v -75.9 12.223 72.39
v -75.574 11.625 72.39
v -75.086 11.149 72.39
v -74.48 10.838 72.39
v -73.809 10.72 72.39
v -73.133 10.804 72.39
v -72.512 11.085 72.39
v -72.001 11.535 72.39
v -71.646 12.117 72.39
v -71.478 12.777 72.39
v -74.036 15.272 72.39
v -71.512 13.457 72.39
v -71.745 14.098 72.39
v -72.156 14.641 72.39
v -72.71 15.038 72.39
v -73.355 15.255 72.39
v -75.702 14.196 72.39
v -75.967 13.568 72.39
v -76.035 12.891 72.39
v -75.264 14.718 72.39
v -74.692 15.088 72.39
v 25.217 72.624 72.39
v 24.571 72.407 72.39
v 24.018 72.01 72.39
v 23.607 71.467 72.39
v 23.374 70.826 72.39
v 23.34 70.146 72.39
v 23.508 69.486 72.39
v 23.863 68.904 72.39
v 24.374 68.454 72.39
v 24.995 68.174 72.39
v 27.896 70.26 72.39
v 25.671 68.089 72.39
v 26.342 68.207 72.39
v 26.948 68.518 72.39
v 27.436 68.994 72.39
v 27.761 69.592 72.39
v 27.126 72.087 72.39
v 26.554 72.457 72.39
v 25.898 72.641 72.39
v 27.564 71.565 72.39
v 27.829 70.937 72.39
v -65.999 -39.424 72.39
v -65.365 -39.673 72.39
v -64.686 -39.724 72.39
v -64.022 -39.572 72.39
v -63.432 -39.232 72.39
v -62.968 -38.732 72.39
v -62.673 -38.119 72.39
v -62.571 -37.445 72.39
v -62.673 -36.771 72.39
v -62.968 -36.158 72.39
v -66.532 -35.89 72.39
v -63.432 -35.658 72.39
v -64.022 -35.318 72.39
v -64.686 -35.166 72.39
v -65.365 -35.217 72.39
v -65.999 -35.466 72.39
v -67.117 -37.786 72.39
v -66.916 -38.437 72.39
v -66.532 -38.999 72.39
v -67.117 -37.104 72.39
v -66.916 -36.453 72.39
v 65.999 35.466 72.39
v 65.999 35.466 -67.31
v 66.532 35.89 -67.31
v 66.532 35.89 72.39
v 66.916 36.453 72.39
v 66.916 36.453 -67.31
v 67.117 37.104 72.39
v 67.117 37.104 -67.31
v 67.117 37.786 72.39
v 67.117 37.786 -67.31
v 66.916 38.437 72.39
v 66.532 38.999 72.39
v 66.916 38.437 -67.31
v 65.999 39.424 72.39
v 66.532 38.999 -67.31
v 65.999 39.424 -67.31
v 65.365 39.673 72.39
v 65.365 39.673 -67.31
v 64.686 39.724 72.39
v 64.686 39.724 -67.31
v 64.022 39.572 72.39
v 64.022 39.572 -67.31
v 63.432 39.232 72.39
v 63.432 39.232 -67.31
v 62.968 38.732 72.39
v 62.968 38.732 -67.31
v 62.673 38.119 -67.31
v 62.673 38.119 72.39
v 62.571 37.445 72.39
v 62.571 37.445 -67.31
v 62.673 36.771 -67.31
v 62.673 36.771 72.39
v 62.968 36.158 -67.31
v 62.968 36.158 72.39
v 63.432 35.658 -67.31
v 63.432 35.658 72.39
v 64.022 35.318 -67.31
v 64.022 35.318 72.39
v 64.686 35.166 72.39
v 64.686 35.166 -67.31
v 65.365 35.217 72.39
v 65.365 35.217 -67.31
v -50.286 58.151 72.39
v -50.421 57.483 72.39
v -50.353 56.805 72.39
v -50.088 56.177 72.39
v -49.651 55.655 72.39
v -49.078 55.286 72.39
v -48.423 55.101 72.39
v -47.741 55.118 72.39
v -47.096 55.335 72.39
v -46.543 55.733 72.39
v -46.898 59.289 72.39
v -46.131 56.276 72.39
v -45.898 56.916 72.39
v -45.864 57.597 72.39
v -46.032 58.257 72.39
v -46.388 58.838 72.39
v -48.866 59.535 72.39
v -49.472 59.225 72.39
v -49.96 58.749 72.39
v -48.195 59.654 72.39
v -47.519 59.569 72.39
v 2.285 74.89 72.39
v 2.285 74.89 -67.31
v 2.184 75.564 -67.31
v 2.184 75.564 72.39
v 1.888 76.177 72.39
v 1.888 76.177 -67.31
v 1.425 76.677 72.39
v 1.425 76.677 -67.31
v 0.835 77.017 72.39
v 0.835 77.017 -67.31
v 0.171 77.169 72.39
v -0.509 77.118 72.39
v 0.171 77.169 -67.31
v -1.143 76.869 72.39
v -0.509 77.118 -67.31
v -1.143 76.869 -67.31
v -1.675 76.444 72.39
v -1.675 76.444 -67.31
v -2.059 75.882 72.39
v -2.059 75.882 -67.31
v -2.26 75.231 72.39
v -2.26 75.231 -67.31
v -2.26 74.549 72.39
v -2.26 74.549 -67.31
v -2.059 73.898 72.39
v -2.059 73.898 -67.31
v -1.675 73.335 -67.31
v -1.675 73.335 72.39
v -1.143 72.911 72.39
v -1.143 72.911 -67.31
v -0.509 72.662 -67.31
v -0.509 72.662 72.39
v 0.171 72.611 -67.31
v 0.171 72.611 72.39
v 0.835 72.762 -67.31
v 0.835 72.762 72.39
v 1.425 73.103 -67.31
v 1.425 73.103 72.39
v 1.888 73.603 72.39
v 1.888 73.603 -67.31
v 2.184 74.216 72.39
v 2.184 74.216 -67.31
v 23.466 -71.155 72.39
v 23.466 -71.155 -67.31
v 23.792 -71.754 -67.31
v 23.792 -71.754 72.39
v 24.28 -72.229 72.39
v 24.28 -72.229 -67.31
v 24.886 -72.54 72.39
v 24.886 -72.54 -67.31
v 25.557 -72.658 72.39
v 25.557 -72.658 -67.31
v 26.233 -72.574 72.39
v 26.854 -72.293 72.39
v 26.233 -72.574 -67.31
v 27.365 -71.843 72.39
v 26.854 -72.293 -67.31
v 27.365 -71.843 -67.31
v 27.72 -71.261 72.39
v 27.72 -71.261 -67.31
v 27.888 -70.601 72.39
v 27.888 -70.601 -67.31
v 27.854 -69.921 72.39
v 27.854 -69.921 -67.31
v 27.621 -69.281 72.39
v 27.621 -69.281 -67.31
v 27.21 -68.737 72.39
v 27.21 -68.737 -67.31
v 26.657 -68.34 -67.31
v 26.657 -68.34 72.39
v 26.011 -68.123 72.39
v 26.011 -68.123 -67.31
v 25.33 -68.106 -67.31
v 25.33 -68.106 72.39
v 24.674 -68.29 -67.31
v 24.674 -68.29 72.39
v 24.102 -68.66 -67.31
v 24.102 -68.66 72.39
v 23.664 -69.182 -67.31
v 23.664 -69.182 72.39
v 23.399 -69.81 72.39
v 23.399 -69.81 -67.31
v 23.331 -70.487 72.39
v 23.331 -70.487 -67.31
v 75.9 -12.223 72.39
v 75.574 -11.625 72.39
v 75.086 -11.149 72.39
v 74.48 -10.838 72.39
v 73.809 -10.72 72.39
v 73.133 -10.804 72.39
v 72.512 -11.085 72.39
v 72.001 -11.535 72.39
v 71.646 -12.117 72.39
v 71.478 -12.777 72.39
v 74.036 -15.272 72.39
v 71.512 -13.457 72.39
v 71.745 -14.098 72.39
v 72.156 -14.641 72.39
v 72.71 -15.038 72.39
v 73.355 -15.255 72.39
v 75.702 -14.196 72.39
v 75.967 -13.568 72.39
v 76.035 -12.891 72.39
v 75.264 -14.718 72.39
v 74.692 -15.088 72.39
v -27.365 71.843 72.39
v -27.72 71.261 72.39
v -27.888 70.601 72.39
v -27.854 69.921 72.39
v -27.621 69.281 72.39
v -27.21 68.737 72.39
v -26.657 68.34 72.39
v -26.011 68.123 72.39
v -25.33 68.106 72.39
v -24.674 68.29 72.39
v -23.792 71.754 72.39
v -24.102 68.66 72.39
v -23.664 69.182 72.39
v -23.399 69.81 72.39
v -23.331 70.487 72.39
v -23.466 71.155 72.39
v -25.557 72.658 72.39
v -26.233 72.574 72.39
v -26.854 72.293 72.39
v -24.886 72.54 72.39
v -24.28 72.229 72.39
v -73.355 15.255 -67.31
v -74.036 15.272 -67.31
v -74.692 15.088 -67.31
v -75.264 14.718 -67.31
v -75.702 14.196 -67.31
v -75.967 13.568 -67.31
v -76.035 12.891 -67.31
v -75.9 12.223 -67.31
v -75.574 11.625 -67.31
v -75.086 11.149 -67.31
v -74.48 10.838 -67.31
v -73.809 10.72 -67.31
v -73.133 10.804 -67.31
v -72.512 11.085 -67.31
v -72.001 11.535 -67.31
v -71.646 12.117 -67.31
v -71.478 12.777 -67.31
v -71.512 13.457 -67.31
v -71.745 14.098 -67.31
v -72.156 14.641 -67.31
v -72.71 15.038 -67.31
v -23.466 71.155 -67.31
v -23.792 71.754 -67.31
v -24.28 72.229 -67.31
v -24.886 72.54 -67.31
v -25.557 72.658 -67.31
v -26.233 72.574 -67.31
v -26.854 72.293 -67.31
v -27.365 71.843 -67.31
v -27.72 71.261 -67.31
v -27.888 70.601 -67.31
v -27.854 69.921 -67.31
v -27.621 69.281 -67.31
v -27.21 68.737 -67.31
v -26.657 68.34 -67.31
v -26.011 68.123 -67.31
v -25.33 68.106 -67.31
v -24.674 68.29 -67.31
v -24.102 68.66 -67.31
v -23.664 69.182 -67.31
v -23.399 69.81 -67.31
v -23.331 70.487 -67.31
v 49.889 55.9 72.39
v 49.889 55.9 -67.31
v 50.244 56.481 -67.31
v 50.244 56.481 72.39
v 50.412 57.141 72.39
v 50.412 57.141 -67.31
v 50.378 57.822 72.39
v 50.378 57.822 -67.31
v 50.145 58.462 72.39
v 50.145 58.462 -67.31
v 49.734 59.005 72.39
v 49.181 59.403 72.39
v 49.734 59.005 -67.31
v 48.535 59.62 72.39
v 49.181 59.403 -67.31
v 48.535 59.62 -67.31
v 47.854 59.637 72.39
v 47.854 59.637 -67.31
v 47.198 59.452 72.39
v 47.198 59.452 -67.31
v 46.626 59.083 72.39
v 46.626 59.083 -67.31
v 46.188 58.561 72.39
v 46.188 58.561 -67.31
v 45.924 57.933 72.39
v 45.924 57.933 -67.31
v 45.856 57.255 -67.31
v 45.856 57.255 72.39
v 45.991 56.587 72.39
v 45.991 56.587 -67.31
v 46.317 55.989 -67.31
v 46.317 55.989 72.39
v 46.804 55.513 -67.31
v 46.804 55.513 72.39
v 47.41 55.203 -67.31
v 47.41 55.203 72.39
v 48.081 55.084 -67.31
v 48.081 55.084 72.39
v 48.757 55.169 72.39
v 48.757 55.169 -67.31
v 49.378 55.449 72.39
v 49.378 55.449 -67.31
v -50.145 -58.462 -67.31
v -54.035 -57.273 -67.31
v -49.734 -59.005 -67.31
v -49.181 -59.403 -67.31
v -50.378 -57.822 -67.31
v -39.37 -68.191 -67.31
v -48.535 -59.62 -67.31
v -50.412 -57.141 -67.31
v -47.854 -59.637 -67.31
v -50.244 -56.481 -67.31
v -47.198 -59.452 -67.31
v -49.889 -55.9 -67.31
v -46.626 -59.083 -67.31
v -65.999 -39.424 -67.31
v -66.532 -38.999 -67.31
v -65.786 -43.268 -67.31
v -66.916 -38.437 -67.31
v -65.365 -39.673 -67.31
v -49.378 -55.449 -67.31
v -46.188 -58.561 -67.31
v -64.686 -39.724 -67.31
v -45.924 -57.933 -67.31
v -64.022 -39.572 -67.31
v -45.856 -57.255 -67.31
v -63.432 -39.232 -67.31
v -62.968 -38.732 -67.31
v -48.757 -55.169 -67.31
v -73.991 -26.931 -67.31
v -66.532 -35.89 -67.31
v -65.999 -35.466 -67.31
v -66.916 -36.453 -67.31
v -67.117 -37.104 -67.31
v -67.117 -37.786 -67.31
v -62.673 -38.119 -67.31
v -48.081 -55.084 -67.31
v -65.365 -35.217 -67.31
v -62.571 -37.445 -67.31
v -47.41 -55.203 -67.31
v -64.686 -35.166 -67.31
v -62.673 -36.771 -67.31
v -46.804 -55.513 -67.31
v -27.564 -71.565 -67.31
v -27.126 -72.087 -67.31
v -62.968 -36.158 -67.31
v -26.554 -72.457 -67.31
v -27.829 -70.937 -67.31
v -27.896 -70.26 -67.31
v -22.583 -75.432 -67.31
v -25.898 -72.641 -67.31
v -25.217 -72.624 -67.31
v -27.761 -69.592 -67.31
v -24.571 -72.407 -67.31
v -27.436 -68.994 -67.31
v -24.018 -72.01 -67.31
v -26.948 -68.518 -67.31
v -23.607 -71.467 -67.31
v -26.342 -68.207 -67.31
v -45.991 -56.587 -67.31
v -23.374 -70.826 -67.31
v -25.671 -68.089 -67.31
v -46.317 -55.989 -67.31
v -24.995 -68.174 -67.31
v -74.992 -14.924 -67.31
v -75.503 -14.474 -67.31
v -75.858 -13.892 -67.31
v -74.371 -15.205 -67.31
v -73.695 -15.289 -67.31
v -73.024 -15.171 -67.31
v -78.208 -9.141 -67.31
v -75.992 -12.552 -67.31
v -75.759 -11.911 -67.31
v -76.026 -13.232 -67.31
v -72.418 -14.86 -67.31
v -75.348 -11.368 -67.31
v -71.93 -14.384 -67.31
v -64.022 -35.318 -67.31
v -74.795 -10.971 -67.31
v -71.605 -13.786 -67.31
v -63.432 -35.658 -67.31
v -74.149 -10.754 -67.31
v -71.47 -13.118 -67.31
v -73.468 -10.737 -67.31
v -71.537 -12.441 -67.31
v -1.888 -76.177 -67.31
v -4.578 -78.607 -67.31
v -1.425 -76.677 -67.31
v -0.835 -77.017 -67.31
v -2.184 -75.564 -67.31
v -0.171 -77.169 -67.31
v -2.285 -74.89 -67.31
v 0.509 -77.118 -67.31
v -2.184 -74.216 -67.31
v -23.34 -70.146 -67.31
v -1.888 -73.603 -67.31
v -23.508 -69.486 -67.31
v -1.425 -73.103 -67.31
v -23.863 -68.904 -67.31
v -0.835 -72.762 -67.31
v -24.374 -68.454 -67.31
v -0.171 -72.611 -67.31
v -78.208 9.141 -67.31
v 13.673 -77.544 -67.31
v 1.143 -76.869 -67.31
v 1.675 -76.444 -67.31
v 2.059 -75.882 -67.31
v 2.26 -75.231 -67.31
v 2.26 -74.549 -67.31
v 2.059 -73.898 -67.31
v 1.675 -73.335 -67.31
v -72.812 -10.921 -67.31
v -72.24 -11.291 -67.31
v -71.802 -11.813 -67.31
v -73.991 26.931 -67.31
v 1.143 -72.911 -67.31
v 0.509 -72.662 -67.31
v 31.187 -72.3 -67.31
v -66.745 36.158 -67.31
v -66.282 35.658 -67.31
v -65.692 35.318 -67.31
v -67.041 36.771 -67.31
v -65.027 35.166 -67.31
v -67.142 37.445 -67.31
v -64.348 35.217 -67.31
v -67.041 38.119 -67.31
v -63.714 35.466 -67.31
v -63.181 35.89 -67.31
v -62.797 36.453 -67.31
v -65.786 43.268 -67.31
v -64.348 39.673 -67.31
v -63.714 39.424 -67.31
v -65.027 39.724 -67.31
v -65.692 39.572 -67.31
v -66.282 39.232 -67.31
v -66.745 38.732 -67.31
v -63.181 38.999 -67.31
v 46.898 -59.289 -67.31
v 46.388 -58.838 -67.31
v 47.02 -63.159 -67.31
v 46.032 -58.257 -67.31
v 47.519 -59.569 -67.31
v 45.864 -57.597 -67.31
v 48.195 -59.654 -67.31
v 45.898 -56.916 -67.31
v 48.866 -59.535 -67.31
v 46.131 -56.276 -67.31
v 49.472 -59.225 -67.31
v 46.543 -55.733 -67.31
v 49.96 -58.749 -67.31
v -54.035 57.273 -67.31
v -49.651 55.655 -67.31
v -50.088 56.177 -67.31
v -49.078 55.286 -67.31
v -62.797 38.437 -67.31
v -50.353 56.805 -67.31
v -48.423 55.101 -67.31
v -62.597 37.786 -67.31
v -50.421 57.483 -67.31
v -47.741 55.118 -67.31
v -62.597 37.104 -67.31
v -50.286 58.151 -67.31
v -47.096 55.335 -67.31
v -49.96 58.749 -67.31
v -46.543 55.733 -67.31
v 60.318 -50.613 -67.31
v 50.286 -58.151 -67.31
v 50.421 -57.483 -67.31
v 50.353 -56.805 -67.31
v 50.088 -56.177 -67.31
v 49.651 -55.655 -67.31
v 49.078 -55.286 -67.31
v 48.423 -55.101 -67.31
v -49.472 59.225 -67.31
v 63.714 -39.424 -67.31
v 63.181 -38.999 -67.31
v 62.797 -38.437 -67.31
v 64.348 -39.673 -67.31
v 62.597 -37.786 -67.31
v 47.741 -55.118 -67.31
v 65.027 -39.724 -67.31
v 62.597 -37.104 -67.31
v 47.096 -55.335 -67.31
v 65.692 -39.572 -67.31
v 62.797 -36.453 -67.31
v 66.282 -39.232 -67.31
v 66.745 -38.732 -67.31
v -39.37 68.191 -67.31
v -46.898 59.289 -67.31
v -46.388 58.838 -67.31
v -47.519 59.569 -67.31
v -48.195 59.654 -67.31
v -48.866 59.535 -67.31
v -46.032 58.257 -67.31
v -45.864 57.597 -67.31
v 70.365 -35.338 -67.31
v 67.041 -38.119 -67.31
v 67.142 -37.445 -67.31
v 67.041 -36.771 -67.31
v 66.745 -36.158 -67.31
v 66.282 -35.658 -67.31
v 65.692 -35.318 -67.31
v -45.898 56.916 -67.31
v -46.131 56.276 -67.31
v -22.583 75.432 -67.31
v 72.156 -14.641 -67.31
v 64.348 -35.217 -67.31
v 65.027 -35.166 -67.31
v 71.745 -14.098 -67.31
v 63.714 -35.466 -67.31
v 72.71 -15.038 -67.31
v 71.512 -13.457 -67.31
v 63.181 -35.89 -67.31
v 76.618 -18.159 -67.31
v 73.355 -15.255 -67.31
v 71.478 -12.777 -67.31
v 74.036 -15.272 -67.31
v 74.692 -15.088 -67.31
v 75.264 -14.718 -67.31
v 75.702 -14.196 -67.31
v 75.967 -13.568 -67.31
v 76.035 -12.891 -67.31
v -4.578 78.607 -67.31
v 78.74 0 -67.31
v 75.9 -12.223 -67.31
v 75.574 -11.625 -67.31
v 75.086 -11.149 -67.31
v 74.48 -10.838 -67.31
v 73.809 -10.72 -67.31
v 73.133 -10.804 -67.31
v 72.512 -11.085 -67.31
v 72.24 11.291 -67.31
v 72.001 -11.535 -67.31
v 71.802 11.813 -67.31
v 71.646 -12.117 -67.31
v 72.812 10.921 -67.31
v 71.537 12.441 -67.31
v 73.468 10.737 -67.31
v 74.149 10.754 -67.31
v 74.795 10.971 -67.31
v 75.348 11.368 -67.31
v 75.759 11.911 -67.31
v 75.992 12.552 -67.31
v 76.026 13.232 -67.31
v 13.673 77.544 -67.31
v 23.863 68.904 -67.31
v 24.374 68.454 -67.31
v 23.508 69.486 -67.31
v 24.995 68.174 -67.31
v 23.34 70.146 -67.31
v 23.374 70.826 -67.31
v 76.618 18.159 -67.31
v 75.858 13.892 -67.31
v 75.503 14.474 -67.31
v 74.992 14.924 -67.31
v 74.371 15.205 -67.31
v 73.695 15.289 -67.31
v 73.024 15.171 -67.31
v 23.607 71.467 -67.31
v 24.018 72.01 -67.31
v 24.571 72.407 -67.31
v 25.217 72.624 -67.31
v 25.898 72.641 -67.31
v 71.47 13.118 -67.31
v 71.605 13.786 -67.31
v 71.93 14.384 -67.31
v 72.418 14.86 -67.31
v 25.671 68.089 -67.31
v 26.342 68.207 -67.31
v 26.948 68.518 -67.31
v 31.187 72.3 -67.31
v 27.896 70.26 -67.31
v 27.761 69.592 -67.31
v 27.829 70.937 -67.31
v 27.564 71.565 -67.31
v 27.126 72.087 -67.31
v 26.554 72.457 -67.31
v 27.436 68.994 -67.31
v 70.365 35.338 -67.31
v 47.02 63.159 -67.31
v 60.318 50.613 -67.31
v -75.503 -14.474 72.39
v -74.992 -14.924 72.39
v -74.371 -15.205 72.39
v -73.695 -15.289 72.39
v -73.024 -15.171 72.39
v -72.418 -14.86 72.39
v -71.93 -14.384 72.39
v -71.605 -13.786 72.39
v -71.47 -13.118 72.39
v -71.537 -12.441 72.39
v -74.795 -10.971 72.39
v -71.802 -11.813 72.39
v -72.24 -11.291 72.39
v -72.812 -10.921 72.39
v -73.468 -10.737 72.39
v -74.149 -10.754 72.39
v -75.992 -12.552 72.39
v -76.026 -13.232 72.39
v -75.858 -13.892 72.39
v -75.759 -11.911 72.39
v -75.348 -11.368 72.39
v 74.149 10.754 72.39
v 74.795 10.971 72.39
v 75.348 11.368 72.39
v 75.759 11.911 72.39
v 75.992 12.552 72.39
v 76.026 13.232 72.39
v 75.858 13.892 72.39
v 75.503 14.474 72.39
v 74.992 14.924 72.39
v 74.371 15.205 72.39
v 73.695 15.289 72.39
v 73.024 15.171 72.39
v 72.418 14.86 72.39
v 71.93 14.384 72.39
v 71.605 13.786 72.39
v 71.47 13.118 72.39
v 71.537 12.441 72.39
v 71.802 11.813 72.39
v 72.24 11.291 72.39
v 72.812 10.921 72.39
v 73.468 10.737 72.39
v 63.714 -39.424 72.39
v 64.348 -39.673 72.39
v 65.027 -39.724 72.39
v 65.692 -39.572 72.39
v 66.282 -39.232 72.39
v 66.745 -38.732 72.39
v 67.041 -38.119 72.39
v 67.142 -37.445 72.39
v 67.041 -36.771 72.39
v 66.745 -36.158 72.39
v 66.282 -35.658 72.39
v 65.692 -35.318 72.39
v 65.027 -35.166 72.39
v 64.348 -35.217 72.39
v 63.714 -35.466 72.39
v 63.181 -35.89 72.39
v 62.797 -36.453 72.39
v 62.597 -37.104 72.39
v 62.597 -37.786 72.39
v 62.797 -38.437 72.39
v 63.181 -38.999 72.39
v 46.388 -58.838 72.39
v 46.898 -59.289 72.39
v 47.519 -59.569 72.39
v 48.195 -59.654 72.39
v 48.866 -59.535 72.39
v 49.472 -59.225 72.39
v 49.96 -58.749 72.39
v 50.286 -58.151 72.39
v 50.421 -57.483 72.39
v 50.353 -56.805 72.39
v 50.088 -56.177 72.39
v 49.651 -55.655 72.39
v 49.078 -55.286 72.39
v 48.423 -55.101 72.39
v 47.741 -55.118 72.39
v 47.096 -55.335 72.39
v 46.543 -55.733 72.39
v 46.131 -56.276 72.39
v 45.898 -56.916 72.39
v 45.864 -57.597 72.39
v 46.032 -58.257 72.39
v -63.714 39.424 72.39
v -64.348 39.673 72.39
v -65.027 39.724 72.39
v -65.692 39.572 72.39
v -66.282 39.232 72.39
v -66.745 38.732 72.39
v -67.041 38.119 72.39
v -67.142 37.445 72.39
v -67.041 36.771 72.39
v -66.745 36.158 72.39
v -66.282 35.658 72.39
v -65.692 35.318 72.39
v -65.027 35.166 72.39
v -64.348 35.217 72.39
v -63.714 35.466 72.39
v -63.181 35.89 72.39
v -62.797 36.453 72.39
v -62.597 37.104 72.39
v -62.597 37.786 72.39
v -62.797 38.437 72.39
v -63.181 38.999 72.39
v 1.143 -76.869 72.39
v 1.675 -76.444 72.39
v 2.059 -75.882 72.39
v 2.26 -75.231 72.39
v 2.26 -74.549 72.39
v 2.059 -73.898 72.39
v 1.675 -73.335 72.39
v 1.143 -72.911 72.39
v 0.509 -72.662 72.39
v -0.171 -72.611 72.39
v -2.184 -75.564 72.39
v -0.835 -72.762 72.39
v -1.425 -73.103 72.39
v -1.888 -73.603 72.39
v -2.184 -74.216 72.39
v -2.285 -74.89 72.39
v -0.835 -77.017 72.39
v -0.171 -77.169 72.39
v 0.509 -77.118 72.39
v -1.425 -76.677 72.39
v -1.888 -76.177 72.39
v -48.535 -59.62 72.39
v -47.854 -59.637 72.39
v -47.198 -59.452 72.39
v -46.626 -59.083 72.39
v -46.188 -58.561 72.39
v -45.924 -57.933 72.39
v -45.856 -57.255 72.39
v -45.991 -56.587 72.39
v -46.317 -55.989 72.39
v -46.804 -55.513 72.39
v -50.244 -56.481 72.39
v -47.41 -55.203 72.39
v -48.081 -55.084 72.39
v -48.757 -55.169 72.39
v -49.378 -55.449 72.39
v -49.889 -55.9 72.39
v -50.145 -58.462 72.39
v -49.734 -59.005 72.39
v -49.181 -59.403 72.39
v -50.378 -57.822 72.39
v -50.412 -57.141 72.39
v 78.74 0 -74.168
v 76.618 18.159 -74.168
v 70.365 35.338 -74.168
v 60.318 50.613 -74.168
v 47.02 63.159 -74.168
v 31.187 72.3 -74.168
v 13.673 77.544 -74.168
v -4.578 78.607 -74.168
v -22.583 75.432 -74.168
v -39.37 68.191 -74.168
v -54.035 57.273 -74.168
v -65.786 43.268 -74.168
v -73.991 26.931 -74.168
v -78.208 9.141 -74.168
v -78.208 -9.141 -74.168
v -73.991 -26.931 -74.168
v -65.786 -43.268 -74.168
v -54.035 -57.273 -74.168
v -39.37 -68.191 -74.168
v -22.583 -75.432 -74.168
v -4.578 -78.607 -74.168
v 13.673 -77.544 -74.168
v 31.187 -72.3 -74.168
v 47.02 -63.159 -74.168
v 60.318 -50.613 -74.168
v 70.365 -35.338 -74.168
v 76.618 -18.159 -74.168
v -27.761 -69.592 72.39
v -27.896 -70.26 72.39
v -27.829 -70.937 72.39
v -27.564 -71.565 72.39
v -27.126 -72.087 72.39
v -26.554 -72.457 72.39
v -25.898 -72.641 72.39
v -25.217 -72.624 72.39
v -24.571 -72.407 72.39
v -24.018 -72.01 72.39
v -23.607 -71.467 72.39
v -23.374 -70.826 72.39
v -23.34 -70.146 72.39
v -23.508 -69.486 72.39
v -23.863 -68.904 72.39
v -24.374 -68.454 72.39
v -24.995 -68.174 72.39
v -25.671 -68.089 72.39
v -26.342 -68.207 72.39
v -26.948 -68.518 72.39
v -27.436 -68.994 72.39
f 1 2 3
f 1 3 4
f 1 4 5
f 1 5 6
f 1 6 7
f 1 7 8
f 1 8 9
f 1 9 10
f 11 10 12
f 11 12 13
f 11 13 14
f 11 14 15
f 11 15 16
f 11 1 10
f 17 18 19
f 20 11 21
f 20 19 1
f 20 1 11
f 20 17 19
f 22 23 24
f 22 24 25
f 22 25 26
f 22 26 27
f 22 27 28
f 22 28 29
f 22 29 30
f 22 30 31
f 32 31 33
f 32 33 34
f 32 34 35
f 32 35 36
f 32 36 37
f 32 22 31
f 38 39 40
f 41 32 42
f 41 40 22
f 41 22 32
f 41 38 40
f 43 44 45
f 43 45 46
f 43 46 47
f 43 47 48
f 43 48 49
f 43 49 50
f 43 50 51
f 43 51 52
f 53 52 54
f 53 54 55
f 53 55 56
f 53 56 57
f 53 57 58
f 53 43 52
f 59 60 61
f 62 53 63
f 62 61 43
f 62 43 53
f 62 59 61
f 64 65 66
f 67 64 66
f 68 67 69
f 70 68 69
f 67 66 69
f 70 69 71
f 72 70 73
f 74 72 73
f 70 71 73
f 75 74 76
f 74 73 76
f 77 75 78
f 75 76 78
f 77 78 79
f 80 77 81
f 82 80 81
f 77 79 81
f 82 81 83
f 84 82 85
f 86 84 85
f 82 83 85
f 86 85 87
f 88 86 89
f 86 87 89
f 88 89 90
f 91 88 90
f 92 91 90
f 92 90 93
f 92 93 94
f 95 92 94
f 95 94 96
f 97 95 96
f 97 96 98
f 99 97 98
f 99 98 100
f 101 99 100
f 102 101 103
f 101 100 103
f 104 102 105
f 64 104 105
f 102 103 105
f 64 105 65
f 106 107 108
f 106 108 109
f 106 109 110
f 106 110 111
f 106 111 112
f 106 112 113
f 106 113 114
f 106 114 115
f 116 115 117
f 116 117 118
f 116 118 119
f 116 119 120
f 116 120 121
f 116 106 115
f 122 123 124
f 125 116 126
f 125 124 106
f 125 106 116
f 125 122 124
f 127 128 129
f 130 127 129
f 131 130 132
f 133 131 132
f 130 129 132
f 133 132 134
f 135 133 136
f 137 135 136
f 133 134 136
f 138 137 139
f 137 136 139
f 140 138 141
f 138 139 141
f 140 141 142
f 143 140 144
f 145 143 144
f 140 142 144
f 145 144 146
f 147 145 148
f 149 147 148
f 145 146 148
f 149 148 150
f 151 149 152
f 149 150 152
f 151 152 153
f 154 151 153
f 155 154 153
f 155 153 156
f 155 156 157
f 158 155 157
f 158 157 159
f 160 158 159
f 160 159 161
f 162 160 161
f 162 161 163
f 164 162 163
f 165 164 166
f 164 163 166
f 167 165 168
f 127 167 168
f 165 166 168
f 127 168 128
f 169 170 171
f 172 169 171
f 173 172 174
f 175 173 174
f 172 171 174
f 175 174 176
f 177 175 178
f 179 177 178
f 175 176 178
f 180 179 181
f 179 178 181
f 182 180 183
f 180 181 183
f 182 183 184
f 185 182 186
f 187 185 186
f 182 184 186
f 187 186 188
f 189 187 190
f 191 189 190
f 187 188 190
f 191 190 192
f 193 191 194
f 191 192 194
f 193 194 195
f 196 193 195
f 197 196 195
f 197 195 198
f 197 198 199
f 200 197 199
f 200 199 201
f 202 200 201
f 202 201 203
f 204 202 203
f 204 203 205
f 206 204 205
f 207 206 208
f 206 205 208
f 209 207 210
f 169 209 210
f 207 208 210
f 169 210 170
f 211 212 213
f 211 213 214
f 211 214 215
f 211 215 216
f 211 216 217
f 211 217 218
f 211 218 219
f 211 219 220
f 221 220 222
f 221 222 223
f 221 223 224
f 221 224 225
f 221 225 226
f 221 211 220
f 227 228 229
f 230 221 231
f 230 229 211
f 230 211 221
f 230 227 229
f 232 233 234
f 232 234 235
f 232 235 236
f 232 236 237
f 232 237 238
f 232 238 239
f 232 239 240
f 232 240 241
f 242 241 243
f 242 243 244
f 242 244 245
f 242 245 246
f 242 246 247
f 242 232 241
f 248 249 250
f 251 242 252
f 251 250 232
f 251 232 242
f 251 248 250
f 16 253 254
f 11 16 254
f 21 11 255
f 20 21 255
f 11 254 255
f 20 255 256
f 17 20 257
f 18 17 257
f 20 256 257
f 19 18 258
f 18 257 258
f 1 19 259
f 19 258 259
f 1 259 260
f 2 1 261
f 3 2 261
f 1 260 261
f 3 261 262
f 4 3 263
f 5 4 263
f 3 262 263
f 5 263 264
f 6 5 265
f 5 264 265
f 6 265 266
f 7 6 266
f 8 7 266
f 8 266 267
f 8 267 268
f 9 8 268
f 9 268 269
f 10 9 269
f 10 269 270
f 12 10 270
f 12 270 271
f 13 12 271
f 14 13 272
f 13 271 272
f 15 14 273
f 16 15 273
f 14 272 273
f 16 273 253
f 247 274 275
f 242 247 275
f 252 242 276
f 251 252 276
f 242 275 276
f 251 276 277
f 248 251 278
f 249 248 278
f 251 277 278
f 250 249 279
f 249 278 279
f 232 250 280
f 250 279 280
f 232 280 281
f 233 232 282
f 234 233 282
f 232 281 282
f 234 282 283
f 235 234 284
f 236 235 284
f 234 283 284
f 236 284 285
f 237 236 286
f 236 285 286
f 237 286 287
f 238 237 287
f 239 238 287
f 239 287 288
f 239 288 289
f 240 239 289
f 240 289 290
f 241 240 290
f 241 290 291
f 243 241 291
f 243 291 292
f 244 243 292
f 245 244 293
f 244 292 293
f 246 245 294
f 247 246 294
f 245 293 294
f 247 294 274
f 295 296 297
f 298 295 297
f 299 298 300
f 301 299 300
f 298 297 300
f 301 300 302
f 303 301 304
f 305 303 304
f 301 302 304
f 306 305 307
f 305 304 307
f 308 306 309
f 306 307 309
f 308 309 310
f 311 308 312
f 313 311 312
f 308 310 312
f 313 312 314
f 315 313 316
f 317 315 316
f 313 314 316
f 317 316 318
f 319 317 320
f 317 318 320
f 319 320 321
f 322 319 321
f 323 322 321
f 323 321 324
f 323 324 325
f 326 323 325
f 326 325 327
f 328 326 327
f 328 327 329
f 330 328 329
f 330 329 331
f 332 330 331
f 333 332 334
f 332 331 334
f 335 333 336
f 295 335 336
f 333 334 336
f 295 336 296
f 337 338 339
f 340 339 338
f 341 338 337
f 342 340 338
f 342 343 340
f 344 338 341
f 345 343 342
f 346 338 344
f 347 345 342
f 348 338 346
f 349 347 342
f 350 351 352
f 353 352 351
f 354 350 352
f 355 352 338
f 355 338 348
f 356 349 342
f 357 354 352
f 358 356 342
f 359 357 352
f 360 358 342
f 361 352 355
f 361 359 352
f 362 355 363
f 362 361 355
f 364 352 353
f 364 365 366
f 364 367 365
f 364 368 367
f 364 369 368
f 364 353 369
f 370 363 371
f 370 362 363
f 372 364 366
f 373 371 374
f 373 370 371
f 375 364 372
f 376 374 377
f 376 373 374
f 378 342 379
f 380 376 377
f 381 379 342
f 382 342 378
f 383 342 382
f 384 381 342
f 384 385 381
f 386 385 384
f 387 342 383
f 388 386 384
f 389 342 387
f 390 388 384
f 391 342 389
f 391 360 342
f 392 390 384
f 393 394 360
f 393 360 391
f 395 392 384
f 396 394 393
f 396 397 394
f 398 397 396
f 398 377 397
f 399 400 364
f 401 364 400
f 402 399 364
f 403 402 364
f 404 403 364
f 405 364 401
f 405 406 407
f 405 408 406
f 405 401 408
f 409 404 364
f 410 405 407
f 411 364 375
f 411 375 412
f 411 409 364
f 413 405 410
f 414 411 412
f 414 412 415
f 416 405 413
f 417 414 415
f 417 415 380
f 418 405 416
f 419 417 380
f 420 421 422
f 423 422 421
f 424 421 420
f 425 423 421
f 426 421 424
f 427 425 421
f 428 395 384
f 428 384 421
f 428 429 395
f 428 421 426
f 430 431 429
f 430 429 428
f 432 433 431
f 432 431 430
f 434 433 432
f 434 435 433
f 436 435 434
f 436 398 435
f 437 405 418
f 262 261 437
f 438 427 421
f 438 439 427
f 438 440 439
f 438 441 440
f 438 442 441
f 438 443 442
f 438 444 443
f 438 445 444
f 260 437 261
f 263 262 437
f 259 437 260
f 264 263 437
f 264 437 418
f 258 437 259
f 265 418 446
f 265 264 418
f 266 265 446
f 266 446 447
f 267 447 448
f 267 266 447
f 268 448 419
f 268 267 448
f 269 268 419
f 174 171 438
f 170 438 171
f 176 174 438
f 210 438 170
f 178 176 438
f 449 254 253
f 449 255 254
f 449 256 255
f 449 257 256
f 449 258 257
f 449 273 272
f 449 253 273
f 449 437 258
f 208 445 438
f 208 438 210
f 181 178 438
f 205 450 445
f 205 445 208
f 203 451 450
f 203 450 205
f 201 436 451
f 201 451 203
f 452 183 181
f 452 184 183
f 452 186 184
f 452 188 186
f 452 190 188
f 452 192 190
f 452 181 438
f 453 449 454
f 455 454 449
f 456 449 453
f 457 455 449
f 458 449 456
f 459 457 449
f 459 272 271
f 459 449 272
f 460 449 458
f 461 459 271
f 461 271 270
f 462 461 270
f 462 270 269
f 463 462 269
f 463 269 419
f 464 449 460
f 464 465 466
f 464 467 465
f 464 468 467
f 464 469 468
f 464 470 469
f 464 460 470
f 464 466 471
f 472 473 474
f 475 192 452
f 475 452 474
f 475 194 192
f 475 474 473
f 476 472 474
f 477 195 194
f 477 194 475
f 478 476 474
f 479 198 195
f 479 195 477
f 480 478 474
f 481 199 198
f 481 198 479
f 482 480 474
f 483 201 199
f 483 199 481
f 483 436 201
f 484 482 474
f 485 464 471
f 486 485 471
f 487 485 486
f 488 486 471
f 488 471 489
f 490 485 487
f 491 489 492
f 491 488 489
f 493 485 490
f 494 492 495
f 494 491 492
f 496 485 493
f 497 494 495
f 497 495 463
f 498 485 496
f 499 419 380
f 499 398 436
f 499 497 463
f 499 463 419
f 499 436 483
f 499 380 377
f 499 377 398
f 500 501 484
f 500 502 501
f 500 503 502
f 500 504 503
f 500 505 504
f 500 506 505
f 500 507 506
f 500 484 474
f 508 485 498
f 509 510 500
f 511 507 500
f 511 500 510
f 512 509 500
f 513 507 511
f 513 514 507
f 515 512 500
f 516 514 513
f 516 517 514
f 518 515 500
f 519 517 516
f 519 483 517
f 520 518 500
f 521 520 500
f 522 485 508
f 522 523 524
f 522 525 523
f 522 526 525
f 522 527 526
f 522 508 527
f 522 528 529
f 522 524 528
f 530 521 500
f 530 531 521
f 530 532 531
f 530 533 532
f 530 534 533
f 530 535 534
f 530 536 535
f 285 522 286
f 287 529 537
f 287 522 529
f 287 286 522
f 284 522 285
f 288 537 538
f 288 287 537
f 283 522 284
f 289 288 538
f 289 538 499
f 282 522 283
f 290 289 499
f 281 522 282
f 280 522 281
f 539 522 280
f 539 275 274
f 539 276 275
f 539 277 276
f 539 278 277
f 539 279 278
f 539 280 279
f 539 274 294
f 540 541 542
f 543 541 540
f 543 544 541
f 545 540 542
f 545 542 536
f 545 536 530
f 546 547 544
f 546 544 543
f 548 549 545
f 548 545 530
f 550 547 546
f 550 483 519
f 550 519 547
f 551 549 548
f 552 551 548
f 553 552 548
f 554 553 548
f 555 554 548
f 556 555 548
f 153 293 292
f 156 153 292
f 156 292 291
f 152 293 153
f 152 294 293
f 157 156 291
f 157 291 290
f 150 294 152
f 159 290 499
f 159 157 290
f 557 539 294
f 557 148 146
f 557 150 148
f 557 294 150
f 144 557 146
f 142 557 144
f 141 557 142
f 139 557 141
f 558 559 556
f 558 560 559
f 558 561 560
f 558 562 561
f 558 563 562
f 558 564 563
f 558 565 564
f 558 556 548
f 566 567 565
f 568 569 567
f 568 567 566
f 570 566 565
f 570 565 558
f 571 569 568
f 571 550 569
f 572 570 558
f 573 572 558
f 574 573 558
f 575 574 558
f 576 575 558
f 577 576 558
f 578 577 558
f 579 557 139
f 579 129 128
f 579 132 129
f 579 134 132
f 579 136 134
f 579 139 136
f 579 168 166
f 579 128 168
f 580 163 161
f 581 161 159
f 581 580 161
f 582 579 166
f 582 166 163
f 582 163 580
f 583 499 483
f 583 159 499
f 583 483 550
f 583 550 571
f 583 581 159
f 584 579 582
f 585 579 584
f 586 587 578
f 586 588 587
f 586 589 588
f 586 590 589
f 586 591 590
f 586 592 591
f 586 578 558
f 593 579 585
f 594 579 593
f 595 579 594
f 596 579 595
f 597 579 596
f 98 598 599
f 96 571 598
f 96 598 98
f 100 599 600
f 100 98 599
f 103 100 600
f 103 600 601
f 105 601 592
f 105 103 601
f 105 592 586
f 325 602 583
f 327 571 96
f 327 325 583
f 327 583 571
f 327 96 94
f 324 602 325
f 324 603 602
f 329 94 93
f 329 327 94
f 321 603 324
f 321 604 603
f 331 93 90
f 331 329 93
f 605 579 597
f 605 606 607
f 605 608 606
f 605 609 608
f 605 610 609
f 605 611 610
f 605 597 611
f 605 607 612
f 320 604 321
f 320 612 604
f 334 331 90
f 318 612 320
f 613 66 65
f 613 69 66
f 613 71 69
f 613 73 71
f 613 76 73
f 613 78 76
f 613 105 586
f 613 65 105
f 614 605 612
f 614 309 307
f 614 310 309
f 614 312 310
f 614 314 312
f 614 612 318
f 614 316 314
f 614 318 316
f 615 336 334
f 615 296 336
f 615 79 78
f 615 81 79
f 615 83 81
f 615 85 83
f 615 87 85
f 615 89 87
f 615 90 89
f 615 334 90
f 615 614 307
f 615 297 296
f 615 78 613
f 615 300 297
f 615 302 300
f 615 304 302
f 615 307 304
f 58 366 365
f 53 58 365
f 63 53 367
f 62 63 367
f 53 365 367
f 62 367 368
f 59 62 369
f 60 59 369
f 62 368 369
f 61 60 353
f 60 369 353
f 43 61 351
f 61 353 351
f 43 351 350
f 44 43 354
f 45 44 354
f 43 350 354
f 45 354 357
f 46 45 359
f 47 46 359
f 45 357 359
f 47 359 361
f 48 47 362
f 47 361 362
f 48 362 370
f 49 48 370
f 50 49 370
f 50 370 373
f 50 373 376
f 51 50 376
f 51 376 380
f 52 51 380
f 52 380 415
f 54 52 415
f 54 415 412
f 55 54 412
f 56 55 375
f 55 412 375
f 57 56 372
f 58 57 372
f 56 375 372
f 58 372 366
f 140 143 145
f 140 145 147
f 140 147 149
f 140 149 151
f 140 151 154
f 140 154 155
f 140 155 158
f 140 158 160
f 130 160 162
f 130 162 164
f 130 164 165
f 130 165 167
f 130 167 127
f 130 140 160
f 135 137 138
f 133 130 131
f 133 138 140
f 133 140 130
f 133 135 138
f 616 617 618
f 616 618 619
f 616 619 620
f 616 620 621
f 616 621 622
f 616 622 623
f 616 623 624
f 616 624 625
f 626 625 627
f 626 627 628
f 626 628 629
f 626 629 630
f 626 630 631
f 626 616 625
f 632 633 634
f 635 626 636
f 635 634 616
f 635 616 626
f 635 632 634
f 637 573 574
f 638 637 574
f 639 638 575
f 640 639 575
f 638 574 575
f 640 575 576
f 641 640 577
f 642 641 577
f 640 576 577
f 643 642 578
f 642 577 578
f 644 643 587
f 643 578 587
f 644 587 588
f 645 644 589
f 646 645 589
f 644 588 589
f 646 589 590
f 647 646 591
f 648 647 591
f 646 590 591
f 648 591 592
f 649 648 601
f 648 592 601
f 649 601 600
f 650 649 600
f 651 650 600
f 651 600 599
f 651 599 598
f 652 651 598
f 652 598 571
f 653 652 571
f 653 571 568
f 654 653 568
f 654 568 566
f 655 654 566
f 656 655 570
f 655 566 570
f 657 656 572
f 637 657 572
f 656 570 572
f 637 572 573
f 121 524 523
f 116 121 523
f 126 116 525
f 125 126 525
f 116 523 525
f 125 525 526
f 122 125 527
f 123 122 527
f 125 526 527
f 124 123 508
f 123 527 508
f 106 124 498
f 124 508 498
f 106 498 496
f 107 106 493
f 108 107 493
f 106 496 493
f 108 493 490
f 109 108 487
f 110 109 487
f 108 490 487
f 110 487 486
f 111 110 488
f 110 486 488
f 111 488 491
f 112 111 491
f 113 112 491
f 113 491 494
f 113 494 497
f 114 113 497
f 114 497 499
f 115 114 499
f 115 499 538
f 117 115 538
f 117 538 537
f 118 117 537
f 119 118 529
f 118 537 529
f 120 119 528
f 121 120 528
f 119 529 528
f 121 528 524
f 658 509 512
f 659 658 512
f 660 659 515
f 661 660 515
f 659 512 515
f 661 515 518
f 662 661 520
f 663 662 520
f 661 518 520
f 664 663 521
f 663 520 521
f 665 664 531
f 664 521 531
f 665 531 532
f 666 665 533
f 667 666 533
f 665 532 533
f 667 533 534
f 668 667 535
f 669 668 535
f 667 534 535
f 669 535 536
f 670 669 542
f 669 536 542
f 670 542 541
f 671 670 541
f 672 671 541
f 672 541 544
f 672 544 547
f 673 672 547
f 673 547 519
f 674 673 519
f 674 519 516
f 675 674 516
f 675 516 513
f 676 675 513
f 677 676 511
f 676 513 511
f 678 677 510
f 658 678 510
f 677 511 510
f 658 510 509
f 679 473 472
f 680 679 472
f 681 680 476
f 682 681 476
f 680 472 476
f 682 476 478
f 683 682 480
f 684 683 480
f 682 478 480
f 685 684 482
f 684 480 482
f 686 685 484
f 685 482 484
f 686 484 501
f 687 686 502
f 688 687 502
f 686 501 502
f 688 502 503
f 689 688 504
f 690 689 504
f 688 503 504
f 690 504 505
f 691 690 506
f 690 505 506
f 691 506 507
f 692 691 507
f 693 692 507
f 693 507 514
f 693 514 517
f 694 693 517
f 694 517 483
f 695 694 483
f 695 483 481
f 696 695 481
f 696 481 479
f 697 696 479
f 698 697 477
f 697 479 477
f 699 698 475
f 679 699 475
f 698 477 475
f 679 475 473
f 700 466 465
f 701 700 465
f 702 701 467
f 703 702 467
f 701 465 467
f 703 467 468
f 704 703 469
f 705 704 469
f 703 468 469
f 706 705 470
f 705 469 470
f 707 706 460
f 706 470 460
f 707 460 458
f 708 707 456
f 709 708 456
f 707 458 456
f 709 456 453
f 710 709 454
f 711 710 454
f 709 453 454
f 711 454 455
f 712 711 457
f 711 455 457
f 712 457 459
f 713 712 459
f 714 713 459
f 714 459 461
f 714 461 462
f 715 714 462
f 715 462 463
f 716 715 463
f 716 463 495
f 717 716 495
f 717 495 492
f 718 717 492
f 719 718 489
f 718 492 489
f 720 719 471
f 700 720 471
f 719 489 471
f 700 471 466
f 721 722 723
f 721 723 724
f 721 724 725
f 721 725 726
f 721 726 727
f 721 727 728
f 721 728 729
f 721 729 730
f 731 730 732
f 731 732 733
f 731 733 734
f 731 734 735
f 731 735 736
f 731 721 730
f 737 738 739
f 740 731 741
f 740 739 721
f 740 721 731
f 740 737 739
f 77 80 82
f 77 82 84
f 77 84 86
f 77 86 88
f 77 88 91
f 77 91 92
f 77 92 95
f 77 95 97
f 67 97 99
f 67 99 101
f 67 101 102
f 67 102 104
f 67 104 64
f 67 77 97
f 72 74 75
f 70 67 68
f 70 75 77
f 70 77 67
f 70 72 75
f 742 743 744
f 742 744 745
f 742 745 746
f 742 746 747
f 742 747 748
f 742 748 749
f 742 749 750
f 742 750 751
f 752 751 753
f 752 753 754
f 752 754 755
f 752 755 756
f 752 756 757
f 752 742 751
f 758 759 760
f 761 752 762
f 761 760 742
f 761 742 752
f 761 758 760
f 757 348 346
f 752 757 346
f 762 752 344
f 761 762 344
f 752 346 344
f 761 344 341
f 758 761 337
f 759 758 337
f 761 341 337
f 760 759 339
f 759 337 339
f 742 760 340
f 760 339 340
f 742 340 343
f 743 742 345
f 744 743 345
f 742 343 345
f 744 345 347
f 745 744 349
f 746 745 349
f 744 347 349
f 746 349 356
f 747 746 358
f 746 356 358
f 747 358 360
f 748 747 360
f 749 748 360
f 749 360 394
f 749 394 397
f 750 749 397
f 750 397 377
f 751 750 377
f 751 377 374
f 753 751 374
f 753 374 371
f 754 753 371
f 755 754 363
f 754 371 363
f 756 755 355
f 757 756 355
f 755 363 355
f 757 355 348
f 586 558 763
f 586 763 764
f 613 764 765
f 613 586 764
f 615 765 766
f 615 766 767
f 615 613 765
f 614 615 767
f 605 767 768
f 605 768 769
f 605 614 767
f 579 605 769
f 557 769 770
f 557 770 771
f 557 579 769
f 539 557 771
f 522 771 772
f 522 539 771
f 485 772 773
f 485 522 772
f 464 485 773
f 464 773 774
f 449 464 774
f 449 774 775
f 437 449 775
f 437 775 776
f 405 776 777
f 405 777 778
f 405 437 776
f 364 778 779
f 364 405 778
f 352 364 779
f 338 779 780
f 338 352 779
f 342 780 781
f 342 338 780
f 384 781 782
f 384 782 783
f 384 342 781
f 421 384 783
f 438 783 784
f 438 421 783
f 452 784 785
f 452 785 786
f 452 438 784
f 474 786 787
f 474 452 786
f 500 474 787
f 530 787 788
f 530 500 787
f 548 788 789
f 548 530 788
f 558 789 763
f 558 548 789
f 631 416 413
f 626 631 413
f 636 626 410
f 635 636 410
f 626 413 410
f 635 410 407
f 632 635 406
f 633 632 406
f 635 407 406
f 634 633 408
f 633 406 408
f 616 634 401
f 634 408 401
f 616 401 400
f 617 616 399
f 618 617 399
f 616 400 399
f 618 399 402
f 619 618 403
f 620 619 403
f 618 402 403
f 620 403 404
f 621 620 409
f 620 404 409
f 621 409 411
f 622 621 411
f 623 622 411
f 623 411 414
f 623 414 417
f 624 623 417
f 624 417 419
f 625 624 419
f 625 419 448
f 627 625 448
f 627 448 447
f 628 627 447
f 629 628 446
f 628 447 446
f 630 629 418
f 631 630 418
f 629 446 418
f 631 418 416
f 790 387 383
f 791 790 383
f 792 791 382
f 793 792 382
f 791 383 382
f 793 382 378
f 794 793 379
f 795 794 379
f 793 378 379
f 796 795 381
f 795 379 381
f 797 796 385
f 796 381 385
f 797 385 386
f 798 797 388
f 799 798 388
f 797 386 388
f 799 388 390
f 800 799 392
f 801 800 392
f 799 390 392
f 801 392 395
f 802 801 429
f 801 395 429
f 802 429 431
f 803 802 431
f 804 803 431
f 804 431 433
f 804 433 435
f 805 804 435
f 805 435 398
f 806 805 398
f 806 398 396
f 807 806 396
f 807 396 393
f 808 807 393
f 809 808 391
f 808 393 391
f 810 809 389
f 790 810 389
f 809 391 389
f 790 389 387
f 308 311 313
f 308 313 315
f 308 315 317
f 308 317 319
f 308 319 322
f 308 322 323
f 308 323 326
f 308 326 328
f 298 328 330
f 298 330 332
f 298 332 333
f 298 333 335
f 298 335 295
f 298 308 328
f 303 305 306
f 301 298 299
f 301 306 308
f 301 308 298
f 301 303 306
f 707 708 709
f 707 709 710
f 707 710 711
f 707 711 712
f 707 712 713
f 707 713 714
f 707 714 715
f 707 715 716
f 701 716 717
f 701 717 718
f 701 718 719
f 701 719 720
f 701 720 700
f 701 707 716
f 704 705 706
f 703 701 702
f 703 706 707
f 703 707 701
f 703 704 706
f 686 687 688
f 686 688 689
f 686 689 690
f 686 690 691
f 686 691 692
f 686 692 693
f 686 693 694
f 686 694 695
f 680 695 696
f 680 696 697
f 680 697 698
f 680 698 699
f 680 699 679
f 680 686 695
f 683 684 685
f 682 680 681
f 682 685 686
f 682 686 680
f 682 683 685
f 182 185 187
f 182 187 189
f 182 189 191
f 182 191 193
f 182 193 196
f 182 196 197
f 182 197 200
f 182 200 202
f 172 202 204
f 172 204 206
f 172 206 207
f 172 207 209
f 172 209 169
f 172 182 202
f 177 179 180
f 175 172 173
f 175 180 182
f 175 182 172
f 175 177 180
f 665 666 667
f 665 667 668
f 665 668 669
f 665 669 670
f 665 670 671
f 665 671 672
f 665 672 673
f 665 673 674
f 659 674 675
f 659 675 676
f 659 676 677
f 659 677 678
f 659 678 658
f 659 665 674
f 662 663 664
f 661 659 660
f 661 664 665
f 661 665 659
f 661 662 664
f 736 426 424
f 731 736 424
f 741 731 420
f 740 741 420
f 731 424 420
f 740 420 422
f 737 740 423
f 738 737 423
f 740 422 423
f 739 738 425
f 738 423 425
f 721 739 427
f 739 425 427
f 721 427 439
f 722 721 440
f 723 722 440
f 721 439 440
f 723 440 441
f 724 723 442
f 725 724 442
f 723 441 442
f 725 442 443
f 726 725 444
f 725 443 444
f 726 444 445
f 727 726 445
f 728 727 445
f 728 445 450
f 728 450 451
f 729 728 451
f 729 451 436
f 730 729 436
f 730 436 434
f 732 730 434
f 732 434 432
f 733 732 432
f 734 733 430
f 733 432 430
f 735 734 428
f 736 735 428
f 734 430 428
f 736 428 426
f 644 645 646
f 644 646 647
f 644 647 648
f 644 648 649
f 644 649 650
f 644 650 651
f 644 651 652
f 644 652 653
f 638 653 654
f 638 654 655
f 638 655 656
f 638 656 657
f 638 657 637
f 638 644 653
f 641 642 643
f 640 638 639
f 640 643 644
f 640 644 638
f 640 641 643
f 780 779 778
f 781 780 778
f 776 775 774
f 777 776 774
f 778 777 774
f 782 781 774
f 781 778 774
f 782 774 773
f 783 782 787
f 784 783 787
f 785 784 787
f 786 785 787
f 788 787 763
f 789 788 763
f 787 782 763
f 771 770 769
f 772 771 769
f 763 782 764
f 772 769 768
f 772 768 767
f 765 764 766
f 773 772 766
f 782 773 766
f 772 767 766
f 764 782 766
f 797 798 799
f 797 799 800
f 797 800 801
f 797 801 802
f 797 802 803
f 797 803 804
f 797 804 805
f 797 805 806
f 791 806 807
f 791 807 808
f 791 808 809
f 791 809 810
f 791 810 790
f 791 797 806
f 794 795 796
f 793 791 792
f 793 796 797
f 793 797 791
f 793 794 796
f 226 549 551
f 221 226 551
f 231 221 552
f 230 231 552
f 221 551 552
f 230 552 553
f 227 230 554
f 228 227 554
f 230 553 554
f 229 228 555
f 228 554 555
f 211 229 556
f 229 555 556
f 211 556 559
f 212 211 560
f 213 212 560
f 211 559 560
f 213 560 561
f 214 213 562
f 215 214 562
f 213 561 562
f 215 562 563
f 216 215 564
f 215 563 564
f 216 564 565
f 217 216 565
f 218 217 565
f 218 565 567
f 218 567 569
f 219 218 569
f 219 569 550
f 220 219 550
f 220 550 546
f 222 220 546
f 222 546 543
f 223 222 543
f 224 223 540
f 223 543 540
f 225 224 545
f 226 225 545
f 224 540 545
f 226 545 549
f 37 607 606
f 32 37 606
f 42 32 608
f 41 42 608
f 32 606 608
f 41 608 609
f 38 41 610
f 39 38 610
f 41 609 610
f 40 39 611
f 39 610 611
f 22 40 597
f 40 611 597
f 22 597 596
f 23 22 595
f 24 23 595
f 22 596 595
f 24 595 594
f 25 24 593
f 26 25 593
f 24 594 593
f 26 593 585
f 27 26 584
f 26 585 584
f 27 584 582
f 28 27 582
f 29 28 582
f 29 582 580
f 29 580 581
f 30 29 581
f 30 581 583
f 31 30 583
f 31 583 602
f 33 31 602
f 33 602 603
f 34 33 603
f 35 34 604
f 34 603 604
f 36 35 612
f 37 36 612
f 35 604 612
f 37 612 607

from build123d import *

# Parameters (mm, degrees)
F1_START        = -67.31
F0_R            = 78.74
F1_DEPTH        = 6.858
F2_R            = 2.285444595
F3_DEPTH        = 139.7
F3_COPIES_COUNT = 18


# Not quite as in the source:
# - a pattern or mirror of a feature is missing from the dataset's text; its kind, count and spacing are read off the source's solid


with BuildPart() as f1:
    # F0 (on Top) → F1 (new body)
    with BuildSketch(Plane.XY.offset(F1_START)):
        Circle(F0_R)
    extrude(amount=-F1_DEPTH)

    # F2 (on face) → F3 (join)
    with BuildSketch(Plane.XY.offset(-67.31)):
        with Locations((0, 74.8899579048)):
            Circle(F2_R)
    f3 = extrude(amount=F3_DEPTH)

    # F3_copies: F3 ×18 about axis
    f3_copies_axis = Axis((0, 0, 0), (0, 0, 1))
    for i in range(1, F3_COPIES_COUNT):
        add(f3.rotate(f3_copies_axis, i * 360 / F3_COPIES_COUNT))


solid = f1.part
